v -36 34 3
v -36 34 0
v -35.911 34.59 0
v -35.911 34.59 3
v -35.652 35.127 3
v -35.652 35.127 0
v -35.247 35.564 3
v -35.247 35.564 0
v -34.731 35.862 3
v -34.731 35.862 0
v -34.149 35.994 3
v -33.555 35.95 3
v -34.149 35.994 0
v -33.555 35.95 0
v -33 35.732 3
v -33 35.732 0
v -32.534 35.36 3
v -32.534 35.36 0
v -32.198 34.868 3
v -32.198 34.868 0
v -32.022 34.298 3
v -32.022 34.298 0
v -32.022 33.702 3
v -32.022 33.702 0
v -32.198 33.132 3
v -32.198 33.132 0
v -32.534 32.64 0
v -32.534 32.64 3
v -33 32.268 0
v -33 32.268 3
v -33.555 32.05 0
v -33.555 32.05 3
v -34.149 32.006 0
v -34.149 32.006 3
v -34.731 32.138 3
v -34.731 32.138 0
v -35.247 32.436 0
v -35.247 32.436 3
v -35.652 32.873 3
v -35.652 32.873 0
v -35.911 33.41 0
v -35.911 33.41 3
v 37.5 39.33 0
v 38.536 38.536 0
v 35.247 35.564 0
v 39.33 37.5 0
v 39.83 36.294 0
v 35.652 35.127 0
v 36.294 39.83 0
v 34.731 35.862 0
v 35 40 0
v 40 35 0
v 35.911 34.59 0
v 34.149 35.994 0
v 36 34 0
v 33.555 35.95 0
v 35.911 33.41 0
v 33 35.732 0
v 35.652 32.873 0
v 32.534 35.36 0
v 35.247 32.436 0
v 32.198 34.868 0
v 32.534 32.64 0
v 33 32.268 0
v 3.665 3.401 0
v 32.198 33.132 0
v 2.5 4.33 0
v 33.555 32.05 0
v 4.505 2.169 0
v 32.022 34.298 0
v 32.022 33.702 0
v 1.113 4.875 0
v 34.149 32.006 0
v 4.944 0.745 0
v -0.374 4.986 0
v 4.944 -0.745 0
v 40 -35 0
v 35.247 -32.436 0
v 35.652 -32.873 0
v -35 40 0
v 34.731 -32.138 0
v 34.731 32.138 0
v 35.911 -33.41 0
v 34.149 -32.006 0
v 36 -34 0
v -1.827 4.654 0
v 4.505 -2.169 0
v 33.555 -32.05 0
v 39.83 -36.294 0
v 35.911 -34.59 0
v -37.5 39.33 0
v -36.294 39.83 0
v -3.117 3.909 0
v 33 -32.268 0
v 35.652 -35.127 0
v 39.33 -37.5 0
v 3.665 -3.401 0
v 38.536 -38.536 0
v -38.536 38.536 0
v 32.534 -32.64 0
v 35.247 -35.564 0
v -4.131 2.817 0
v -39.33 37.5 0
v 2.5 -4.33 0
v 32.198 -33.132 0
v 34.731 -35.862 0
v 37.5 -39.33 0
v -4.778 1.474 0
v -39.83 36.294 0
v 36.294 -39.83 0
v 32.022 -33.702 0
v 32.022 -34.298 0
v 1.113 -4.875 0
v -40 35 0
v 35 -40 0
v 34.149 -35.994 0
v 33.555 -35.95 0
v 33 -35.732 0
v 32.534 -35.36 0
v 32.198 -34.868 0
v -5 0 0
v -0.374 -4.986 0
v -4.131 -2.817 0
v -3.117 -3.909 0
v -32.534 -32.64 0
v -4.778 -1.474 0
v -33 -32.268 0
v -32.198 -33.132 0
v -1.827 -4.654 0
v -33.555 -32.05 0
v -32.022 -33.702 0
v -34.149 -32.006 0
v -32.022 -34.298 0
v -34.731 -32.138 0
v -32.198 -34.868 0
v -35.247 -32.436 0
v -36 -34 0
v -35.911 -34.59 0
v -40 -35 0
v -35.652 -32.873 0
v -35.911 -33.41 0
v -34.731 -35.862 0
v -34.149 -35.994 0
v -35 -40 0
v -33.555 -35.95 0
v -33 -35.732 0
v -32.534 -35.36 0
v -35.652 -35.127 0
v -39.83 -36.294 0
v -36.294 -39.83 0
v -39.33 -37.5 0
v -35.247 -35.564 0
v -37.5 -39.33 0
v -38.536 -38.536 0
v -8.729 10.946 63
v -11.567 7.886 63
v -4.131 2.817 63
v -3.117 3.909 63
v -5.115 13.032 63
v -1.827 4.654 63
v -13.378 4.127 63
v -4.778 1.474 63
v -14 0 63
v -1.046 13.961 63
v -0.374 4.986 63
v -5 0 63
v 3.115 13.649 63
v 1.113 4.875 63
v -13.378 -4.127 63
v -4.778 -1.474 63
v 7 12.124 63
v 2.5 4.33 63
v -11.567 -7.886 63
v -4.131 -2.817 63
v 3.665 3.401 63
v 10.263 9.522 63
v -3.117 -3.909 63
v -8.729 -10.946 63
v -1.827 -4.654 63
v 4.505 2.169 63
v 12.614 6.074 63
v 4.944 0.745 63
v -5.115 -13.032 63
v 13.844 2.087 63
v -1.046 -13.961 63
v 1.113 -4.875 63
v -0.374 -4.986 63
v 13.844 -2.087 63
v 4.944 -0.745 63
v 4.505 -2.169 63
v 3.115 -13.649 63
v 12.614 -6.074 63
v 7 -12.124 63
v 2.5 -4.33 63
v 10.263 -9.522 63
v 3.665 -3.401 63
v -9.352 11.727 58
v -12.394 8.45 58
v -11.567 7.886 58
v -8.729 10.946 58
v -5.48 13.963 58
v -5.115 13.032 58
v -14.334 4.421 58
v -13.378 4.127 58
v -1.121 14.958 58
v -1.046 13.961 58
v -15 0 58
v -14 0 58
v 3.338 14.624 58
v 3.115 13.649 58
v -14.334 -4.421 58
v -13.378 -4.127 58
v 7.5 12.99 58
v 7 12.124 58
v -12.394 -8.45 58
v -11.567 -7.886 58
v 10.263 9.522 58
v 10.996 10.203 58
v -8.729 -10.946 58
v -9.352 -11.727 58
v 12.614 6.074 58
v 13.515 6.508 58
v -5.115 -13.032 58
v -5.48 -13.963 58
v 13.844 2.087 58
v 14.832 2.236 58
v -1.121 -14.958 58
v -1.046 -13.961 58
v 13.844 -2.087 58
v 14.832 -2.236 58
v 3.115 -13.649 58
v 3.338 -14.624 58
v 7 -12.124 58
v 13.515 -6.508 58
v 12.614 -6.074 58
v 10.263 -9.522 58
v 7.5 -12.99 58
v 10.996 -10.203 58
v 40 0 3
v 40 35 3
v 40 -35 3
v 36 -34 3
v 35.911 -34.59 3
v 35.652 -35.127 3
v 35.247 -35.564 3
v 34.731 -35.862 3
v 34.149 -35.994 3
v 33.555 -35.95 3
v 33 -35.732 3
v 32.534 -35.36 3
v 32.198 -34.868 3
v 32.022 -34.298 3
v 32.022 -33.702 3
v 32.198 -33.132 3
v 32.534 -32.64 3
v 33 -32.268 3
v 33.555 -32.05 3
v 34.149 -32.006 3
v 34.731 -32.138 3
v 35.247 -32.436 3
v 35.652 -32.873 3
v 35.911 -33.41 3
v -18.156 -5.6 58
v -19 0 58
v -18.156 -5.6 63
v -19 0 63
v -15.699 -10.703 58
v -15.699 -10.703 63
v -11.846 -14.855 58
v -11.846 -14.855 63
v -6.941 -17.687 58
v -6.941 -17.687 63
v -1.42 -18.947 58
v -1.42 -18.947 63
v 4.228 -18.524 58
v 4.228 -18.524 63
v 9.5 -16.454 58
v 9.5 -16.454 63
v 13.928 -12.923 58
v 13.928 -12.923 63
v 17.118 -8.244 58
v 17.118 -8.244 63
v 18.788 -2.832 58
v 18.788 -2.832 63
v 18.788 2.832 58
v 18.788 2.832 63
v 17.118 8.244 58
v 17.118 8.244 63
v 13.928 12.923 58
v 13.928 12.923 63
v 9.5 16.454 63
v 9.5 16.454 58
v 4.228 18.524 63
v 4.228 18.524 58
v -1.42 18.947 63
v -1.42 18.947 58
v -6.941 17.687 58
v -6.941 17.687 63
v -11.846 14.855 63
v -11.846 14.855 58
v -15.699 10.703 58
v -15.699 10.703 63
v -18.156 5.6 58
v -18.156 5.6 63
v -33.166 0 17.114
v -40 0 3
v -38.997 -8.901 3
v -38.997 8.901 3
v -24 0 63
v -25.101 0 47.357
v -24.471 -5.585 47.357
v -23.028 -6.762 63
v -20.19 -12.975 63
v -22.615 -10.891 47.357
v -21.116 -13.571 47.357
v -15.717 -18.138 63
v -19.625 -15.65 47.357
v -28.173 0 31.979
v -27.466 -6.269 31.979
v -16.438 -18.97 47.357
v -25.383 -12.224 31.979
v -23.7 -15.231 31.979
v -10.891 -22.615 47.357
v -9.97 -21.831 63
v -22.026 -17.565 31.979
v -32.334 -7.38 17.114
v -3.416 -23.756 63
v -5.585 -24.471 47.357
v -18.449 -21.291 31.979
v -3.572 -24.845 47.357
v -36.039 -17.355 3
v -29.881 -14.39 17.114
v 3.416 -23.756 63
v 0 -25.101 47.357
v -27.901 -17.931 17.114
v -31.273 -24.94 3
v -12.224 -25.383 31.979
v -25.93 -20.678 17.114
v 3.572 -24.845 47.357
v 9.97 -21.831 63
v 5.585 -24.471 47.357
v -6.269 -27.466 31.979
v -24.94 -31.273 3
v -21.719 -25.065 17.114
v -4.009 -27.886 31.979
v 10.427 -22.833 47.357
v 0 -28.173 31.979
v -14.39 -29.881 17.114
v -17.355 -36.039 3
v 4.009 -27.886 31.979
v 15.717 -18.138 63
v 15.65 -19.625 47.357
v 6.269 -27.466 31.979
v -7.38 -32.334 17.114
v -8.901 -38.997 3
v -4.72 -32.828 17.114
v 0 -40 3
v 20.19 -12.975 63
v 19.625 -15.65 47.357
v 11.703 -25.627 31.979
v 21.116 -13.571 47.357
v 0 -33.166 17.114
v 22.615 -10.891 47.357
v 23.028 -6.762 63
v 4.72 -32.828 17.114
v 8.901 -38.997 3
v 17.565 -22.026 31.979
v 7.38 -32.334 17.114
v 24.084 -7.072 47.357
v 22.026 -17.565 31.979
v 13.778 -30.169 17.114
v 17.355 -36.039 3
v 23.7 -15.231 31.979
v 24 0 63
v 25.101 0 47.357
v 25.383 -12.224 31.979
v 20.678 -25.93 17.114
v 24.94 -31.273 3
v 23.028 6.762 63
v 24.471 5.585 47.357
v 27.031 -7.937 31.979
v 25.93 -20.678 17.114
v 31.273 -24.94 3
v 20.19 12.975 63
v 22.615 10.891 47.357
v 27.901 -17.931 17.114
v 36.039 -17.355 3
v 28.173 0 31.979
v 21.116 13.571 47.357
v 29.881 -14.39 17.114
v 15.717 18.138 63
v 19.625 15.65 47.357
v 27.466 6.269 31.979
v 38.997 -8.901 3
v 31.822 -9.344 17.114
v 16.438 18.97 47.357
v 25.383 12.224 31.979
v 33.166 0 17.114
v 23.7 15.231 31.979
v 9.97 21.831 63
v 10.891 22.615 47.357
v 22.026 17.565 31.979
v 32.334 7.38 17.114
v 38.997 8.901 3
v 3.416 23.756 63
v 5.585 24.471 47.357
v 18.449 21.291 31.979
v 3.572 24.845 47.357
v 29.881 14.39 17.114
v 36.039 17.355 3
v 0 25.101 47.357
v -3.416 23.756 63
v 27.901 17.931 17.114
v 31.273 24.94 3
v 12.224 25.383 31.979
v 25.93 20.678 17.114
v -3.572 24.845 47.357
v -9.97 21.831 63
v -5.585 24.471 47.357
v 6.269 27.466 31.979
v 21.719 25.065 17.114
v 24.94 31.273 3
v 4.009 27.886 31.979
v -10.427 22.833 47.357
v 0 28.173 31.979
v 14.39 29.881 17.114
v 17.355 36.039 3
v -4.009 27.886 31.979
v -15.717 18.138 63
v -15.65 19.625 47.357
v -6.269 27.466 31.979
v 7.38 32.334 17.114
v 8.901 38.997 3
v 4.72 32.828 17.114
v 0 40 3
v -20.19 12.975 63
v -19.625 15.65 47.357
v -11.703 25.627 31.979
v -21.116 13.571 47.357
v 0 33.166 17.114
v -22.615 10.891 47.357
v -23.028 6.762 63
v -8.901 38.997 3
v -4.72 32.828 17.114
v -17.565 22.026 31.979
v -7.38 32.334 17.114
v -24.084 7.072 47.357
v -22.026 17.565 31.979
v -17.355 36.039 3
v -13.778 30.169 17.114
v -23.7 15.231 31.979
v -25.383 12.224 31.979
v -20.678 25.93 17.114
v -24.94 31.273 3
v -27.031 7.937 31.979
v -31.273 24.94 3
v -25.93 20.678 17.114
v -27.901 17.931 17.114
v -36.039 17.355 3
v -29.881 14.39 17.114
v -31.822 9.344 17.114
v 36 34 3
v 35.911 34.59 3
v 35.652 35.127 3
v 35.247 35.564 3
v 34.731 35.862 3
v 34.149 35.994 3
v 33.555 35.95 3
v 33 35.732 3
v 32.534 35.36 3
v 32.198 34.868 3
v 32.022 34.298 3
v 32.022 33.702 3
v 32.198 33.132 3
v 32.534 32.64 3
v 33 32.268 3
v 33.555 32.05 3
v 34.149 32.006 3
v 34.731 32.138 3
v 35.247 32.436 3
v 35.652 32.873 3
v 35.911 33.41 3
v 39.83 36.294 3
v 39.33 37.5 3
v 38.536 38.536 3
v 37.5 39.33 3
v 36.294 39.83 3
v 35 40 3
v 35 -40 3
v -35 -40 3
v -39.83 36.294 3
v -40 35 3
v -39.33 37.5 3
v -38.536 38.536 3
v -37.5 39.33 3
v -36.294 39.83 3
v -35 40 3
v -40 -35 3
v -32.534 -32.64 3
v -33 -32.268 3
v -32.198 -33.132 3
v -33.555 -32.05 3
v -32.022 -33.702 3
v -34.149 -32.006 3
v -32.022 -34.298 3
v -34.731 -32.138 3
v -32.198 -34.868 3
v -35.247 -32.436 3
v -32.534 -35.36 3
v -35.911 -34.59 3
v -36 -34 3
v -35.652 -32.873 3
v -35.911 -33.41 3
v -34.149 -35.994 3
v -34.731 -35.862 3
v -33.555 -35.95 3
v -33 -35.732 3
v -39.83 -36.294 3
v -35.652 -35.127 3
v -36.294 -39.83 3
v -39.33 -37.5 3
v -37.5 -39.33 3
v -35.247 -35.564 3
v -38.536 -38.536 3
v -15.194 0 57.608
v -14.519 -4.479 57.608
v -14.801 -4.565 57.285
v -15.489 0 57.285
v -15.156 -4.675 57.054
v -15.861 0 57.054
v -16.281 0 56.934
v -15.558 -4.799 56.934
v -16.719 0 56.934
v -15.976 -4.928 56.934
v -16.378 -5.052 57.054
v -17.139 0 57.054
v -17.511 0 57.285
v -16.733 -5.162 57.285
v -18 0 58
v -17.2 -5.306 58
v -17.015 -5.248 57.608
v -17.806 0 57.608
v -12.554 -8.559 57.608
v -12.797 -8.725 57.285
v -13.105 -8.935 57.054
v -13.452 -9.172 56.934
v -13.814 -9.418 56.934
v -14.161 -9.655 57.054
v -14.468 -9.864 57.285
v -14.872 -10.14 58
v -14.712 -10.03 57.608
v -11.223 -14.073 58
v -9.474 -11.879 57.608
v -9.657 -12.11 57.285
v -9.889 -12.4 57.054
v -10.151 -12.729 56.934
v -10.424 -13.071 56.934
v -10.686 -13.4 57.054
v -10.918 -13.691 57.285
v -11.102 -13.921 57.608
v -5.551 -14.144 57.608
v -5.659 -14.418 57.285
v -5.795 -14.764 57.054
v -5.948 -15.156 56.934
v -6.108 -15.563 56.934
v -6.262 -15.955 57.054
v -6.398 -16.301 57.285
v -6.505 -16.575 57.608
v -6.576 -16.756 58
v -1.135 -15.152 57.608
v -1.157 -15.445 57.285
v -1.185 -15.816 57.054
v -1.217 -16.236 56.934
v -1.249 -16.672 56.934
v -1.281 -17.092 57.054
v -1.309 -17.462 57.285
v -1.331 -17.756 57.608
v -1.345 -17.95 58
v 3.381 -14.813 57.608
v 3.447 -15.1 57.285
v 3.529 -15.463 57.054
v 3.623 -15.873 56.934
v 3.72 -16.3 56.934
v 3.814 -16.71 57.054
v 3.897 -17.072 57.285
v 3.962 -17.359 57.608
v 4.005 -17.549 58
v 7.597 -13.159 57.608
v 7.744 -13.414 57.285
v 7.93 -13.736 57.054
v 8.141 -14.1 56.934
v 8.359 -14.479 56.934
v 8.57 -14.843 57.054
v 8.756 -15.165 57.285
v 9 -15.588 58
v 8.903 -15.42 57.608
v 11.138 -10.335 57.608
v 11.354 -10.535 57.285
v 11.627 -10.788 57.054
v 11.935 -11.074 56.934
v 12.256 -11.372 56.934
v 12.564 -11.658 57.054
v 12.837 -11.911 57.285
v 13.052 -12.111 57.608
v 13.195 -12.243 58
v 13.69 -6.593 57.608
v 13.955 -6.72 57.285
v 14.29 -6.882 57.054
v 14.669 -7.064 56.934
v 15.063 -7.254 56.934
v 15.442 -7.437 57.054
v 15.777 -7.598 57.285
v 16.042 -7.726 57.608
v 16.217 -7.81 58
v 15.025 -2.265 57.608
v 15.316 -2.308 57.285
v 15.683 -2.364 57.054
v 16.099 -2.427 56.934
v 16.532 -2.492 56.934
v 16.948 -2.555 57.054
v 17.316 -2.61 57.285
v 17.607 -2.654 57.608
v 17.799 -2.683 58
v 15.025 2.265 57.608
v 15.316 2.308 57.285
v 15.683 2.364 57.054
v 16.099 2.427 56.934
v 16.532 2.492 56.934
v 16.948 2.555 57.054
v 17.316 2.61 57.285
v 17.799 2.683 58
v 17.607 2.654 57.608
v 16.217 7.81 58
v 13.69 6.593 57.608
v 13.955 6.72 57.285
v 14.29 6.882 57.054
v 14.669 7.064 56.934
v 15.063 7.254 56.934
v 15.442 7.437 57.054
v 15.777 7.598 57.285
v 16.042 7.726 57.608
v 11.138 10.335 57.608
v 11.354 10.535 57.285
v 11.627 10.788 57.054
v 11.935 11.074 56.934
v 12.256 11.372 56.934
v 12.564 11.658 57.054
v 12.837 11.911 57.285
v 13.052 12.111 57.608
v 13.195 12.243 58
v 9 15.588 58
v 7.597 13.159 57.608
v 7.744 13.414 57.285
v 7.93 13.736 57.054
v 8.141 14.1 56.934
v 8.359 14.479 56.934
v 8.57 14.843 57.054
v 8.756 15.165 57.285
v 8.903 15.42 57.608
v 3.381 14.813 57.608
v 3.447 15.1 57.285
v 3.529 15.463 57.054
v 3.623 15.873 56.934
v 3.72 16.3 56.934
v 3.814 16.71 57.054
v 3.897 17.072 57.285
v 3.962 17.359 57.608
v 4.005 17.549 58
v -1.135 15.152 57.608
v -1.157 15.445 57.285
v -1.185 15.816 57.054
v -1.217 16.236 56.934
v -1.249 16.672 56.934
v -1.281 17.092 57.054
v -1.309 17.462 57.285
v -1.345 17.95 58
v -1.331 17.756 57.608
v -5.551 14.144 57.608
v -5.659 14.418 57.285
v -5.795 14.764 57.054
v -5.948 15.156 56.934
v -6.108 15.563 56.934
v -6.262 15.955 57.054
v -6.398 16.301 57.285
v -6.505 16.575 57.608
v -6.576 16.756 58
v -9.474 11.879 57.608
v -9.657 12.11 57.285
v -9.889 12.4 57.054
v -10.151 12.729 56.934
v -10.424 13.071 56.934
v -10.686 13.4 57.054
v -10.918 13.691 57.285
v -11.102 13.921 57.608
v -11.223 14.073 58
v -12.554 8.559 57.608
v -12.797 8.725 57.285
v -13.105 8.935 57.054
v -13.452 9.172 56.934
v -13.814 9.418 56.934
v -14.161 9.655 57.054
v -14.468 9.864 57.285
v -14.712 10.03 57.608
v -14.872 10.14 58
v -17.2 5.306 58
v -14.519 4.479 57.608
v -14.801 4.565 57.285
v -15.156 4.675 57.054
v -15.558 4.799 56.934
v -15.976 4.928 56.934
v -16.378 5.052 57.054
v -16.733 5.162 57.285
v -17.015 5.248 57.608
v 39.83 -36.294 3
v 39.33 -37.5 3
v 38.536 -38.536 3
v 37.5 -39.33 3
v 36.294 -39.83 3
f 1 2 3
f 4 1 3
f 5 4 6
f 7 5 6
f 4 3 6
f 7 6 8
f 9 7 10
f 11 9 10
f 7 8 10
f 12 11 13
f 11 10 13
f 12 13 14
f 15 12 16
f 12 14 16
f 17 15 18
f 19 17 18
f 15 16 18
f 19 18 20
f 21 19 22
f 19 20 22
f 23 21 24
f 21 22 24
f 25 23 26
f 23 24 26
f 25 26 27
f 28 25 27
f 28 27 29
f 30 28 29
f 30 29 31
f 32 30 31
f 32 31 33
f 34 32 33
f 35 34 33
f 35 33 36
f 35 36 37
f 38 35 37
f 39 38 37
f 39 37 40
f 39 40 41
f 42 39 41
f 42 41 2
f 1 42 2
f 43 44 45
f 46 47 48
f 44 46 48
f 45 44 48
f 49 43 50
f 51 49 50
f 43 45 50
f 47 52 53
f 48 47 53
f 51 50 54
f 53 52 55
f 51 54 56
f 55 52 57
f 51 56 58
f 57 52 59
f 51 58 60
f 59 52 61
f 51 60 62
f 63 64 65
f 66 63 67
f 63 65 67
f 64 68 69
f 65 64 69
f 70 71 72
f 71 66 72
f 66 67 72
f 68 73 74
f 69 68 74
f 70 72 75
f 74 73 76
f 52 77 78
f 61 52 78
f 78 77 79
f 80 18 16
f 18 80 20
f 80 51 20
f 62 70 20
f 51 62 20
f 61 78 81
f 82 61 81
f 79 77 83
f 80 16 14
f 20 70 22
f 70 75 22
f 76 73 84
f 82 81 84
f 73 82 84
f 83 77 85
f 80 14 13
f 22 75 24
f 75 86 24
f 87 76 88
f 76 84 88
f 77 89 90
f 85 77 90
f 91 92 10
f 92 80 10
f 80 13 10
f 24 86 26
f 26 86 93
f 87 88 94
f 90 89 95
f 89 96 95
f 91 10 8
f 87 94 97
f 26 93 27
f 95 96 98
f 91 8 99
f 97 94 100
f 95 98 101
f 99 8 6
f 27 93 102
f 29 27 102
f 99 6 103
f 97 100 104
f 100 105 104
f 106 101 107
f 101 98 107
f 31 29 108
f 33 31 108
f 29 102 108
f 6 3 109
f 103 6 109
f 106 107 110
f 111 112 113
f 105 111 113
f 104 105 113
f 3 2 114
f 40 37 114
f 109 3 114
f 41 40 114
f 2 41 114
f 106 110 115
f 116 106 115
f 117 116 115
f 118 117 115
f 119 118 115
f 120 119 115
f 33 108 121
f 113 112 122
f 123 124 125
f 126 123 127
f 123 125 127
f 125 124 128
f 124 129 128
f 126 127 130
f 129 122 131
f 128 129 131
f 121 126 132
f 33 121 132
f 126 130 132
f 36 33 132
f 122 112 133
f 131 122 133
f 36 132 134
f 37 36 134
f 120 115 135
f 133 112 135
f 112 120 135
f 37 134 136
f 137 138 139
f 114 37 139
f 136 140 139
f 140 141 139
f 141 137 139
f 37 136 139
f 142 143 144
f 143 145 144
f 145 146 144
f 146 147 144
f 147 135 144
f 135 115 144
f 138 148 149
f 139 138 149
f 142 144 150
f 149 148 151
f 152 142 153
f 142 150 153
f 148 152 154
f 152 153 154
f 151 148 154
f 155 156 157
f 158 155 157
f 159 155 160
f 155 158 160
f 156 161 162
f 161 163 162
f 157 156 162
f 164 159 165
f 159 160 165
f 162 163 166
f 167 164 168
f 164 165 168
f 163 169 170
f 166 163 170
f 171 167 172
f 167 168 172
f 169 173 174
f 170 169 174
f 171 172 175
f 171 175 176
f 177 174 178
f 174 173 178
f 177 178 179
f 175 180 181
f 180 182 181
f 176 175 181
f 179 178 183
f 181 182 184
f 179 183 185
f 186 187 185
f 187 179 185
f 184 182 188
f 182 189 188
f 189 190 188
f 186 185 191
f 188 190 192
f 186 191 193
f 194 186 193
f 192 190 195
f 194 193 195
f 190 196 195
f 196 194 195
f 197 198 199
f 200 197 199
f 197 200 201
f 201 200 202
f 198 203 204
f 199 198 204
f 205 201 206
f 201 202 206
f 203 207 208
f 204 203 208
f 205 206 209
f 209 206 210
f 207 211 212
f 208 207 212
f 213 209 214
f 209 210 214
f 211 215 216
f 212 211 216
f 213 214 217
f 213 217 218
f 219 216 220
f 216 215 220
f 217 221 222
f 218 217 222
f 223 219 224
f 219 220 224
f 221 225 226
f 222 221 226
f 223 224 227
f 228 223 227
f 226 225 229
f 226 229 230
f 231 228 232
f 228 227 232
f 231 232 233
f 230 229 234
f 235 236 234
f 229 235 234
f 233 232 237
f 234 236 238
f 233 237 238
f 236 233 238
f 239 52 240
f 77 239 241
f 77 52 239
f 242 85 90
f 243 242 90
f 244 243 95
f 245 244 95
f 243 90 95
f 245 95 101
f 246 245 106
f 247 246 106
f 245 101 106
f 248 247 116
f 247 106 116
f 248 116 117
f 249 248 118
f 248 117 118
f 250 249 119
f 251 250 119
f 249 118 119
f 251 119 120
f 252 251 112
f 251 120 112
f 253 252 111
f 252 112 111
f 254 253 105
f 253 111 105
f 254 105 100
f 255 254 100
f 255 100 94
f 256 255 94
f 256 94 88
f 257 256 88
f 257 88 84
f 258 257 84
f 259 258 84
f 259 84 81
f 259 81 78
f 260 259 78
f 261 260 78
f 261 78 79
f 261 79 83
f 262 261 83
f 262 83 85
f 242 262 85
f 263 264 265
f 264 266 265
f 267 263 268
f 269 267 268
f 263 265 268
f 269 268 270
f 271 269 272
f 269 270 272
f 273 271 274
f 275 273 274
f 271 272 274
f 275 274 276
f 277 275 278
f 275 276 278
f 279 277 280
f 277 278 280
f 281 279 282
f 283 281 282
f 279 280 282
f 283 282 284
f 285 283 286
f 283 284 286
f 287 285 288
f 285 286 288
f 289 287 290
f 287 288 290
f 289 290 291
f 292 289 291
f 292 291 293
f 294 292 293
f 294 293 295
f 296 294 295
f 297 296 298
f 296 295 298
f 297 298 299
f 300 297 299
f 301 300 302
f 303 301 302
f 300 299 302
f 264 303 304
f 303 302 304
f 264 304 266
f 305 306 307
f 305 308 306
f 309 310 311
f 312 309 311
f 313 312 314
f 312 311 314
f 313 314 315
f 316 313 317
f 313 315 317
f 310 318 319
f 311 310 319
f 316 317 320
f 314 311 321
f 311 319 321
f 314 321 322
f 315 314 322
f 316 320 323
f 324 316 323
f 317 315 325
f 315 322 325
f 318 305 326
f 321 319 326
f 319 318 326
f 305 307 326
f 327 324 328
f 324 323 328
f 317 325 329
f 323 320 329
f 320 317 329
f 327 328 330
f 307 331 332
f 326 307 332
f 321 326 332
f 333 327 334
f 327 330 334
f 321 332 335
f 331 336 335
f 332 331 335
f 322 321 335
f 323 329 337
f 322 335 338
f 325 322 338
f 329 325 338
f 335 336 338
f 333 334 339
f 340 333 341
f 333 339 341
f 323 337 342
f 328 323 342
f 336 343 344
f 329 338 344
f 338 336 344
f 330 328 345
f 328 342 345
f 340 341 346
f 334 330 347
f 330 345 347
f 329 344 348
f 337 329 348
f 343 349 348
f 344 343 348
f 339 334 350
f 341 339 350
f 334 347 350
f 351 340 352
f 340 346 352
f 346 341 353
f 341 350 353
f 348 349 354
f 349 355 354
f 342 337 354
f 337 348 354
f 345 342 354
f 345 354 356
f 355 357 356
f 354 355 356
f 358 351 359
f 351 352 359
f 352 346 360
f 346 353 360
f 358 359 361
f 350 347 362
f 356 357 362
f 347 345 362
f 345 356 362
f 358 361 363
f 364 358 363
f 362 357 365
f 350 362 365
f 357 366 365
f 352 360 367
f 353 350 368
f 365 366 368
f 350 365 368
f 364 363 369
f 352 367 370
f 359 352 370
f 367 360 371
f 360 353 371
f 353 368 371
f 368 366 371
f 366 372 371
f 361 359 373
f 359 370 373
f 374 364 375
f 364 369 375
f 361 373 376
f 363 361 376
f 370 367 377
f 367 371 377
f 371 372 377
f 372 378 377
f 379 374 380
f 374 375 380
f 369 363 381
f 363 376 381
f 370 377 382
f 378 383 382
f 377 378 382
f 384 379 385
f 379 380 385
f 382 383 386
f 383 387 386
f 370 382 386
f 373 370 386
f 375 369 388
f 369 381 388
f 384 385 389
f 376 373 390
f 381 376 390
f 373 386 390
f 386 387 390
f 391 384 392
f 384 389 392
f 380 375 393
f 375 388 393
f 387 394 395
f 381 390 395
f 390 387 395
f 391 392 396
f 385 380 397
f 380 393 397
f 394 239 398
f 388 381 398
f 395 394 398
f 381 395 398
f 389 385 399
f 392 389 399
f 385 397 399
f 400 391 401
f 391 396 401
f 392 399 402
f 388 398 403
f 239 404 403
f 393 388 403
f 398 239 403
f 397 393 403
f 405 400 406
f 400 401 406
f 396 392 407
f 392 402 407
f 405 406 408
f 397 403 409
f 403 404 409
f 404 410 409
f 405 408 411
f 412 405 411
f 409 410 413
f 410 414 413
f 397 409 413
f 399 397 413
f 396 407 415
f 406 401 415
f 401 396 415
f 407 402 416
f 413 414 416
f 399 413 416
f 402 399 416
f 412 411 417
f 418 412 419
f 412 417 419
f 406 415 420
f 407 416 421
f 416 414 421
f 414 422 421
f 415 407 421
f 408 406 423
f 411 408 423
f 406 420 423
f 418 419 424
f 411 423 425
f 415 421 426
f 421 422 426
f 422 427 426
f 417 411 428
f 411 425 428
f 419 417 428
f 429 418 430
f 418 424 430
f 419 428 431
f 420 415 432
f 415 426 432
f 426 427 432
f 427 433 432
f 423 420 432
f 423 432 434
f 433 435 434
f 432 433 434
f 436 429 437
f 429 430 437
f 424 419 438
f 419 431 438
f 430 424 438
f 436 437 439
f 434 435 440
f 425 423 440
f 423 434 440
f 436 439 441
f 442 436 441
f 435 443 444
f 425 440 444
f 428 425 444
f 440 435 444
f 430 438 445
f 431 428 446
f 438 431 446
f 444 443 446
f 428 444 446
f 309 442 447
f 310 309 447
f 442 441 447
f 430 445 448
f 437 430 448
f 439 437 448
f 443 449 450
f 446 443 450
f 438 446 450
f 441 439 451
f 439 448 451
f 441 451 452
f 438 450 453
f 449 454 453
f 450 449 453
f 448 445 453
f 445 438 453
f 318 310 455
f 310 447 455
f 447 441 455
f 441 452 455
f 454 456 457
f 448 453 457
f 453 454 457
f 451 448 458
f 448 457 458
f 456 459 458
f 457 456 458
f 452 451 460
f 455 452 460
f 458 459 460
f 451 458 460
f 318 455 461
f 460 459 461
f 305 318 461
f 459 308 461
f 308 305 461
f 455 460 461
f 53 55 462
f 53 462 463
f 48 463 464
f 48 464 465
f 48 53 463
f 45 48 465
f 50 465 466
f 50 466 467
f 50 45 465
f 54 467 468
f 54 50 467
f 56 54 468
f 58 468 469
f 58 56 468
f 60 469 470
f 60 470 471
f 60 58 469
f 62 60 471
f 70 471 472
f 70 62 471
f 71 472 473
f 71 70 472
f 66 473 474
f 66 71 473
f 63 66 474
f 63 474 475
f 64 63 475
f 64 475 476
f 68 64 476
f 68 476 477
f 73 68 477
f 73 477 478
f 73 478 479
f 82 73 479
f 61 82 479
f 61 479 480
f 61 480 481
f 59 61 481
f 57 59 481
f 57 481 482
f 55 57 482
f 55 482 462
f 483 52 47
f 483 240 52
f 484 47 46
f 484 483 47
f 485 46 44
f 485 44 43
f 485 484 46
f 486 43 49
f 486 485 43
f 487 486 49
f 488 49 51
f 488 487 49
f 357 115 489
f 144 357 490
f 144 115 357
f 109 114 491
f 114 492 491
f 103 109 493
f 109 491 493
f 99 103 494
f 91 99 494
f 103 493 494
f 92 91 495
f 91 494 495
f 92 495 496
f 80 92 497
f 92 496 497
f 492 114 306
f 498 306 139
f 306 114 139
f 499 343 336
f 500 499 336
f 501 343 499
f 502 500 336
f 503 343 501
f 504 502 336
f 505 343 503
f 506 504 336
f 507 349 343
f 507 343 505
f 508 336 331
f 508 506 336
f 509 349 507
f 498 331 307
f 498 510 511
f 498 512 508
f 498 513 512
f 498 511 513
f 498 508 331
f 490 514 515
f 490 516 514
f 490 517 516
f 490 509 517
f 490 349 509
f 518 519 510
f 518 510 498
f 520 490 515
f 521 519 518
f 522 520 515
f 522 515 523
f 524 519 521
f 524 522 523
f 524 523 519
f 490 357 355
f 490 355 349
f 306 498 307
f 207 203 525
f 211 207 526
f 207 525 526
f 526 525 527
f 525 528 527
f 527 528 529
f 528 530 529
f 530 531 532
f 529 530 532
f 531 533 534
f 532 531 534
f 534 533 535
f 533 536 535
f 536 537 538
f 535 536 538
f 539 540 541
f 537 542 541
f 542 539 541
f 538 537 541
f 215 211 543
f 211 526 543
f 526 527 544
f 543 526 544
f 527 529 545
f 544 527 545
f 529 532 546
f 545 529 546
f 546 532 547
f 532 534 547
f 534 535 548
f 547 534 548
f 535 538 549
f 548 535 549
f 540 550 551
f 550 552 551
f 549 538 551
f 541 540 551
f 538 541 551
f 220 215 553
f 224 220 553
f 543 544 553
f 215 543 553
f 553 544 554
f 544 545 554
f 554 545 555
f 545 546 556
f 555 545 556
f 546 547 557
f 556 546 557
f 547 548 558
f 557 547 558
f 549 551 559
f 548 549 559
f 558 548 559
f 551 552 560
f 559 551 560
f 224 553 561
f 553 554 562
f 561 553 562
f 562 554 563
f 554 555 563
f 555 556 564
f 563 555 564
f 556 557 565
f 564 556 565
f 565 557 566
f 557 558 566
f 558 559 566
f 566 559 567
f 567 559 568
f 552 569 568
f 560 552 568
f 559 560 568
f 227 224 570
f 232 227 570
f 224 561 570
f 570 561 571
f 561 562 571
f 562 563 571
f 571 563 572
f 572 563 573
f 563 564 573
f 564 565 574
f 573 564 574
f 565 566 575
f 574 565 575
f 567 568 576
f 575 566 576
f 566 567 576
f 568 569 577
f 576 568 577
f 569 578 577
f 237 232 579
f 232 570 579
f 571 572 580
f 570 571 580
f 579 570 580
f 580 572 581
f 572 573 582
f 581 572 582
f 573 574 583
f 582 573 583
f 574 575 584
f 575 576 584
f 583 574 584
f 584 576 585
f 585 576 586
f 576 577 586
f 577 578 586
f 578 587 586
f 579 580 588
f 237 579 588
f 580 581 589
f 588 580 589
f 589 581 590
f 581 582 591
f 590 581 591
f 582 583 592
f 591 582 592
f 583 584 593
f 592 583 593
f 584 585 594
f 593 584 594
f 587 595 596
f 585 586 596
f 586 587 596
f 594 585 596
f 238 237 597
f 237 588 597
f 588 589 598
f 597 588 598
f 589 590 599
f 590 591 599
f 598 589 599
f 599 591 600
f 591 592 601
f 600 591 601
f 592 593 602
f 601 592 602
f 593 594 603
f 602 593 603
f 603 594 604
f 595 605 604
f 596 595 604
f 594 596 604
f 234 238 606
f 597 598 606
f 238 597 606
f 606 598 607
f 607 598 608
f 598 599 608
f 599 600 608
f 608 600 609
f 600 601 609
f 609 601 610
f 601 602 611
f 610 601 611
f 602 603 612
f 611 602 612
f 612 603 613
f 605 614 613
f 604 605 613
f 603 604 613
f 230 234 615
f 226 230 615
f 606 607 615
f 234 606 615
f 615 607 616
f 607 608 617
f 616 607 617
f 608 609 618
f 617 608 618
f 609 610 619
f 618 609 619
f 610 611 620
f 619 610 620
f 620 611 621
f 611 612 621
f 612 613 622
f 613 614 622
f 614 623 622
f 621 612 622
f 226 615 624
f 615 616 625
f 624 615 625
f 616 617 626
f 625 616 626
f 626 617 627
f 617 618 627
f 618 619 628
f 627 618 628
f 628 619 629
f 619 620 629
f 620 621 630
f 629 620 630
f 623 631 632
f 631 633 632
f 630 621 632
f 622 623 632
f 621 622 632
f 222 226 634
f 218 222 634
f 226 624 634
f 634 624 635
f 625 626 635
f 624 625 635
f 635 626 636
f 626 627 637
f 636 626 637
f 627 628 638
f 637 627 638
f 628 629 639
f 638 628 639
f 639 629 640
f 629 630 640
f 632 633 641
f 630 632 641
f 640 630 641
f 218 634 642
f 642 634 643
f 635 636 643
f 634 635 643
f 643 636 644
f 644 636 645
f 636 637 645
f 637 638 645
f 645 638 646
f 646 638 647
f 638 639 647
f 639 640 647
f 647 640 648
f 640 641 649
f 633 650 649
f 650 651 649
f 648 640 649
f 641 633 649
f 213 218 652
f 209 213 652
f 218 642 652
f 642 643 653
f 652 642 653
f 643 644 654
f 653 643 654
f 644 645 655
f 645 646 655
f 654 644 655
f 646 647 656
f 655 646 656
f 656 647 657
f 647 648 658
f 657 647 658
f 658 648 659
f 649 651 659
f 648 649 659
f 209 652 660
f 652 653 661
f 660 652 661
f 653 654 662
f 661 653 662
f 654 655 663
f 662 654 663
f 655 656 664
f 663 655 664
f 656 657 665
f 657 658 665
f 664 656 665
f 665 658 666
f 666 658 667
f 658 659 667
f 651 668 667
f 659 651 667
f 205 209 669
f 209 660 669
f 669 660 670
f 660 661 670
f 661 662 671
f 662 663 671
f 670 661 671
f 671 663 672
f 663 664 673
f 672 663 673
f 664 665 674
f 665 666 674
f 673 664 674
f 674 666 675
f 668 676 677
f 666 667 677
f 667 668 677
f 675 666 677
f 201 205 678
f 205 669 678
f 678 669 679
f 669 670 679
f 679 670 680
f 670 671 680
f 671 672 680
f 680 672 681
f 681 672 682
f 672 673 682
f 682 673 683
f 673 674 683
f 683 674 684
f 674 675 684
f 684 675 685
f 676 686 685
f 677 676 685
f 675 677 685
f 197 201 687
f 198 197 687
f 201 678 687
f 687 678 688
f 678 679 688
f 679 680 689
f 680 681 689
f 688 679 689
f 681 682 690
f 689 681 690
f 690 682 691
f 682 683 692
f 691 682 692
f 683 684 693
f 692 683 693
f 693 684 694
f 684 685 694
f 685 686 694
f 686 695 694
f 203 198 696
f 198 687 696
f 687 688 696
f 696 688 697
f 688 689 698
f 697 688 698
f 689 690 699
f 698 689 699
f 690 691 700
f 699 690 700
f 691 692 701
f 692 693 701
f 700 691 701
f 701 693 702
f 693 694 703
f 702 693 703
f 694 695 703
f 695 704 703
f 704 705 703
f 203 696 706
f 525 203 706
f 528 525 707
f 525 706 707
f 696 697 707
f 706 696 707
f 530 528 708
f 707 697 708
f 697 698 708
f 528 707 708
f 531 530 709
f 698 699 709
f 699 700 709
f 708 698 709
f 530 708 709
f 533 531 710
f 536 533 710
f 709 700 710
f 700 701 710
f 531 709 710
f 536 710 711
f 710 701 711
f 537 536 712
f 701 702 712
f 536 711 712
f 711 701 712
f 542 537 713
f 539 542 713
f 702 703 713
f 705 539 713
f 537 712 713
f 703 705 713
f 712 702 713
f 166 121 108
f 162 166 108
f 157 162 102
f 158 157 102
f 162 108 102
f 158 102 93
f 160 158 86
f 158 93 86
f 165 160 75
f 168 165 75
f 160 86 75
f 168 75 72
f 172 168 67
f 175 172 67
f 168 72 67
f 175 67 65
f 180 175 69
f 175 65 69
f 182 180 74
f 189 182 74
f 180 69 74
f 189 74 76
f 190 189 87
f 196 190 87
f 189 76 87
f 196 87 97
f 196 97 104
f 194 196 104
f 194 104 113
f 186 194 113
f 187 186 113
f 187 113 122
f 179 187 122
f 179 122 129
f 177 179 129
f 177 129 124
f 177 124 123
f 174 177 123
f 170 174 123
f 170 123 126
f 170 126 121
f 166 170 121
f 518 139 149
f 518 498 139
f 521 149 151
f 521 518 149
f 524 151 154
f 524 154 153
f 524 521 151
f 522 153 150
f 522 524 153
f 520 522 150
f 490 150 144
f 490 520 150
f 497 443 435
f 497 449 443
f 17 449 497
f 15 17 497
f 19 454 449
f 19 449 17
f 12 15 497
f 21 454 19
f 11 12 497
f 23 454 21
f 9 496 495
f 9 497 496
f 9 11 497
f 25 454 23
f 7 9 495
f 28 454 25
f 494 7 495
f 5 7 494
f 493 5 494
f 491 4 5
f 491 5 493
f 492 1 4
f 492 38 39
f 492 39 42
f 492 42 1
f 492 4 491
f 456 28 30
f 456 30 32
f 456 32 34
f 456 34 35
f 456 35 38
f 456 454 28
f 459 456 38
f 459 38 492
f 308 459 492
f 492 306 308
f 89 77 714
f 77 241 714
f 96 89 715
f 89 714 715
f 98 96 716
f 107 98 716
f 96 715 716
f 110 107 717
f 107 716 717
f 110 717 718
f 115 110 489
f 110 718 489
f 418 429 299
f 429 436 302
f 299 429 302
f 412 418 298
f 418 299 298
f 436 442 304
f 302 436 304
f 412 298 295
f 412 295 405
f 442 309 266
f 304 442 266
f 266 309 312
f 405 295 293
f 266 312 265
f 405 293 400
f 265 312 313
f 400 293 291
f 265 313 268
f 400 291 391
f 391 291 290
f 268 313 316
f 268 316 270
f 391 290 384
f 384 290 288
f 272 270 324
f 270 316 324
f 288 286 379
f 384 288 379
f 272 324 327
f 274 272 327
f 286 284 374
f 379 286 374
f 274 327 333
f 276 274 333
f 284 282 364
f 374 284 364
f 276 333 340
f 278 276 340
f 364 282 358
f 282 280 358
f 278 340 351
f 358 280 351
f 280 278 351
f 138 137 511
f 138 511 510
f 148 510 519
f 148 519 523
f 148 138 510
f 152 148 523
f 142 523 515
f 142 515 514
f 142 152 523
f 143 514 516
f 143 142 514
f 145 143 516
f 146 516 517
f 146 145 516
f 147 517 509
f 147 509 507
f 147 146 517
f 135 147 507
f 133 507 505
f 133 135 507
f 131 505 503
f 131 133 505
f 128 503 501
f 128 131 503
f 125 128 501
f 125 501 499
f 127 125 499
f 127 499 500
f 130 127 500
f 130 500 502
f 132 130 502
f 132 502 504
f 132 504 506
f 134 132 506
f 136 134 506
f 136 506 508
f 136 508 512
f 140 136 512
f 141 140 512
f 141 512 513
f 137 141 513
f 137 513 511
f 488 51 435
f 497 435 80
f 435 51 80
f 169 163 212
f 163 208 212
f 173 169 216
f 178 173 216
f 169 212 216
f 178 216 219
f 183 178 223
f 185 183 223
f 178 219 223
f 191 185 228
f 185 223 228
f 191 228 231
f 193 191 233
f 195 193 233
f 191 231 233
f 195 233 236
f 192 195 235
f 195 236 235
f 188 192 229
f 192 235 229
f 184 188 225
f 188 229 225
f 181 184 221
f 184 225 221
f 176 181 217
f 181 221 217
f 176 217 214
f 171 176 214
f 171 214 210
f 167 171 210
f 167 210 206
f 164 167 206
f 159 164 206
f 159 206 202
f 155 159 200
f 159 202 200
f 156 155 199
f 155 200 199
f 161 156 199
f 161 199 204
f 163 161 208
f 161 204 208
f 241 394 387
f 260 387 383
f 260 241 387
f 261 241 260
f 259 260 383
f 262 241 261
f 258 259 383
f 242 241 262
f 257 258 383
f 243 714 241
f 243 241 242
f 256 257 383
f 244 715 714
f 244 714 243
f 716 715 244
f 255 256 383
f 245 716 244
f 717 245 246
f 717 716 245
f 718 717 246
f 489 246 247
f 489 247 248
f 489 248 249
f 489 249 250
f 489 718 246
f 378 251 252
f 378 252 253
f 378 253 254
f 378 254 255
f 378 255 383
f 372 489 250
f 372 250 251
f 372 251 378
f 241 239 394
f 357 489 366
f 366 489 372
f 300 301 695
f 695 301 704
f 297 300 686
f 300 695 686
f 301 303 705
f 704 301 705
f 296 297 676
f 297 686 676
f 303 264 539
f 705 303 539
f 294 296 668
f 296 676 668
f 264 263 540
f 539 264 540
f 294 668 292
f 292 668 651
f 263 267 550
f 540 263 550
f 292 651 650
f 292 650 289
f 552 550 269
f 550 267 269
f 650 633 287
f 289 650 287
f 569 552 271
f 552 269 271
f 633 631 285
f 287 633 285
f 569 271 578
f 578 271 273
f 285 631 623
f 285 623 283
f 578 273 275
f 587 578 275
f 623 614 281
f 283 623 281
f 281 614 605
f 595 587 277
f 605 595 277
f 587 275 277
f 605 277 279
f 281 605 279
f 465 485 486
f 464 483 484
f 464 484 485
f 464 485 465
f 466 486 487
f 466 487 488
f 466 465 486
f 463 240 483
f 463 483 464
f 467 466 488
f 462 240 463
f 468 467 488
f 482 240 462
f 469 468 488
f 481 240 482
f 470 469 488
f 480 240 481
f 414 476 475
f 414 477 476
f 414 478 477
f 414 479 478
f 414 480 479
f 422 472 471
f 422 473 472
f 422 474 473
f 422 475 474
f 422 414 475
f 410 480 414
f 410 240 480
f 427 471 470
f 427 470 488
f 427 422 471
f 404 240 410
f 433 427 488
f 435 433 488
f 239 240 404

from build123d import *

# Parameters (mm, degrees)
F0_W     = 40
F0_H     = 40
F1_DEPTH = 3
F3_D     = 4
F4_R     = 5
F10_D    = 10


with BuildPart() as f1:
    # F0 (on Top) → F1 (new body)
    with BuildSketch(Plane.XY):
        with Locations((-20, 20)):
            Rectangle(F0_W, F0_H)
    extrude(amount=F1_DEPTH)

    # F3 (through all)
    with Locations(Plane.XY.offset(3)):
        with Locations((-34, 34)):
            Hole(F3_D / 2)

    # F4
    f4_edges = [f1.edges().sort_by_distance(p)[0] for p in [
        (-40, 40, 1.5),
    ]]
    fillet(f4_edges, radius=F4_R)

    # F5: F1 across face


with BuildPart() as f1_1:
    add(f1.part)
    add(f1.part.mirror(Plane(origin=(-20, 0, 1.5), x_dir=(1, 0, 0), z_dir=(0, -1, 0))))

    # F6: F1 across face


with BuildPart() as f1_2:
    add(f1_1.part)
    add(f1_1.part.mirror(Plane(origin=(0, 0, 1.5), x_dir=(0, 1, 0), z_dir=(1, 0, 0))))

    # F7 (on Front) → F8 (revolve)
    with BuildSketch(Plane.XZ):
        with BuildLine():
            Line((-40, 3), (0, 3))
            Line((0, 3), (0, 63))
            Line((0, 63), (-14, 63))
            Line((-14, 63), (-14, 58))
            Line((-14, 58), (-15, 58))
            ThreePointArc((-15, 58), (-16.5, 56.918861), (-18, 58))
            Line((-18, 58), (-19, 58))
            Line((-19, 58), (-19, 63))
            Line((-19, 63), (-24, 63))
            ThreePointArc((-24, 63), (-28.172502, 31.979334), (-40, 3))
        make_face()
    revolve(axis=Axis((0, 0, 33), (0, 0, 1)))

    # F10 (through all)
    with Locations(Plane.XY.offset(63)):
        with Locations((0, 0)):
            Hole(F10_D / 2)


solid = f1_2.part
